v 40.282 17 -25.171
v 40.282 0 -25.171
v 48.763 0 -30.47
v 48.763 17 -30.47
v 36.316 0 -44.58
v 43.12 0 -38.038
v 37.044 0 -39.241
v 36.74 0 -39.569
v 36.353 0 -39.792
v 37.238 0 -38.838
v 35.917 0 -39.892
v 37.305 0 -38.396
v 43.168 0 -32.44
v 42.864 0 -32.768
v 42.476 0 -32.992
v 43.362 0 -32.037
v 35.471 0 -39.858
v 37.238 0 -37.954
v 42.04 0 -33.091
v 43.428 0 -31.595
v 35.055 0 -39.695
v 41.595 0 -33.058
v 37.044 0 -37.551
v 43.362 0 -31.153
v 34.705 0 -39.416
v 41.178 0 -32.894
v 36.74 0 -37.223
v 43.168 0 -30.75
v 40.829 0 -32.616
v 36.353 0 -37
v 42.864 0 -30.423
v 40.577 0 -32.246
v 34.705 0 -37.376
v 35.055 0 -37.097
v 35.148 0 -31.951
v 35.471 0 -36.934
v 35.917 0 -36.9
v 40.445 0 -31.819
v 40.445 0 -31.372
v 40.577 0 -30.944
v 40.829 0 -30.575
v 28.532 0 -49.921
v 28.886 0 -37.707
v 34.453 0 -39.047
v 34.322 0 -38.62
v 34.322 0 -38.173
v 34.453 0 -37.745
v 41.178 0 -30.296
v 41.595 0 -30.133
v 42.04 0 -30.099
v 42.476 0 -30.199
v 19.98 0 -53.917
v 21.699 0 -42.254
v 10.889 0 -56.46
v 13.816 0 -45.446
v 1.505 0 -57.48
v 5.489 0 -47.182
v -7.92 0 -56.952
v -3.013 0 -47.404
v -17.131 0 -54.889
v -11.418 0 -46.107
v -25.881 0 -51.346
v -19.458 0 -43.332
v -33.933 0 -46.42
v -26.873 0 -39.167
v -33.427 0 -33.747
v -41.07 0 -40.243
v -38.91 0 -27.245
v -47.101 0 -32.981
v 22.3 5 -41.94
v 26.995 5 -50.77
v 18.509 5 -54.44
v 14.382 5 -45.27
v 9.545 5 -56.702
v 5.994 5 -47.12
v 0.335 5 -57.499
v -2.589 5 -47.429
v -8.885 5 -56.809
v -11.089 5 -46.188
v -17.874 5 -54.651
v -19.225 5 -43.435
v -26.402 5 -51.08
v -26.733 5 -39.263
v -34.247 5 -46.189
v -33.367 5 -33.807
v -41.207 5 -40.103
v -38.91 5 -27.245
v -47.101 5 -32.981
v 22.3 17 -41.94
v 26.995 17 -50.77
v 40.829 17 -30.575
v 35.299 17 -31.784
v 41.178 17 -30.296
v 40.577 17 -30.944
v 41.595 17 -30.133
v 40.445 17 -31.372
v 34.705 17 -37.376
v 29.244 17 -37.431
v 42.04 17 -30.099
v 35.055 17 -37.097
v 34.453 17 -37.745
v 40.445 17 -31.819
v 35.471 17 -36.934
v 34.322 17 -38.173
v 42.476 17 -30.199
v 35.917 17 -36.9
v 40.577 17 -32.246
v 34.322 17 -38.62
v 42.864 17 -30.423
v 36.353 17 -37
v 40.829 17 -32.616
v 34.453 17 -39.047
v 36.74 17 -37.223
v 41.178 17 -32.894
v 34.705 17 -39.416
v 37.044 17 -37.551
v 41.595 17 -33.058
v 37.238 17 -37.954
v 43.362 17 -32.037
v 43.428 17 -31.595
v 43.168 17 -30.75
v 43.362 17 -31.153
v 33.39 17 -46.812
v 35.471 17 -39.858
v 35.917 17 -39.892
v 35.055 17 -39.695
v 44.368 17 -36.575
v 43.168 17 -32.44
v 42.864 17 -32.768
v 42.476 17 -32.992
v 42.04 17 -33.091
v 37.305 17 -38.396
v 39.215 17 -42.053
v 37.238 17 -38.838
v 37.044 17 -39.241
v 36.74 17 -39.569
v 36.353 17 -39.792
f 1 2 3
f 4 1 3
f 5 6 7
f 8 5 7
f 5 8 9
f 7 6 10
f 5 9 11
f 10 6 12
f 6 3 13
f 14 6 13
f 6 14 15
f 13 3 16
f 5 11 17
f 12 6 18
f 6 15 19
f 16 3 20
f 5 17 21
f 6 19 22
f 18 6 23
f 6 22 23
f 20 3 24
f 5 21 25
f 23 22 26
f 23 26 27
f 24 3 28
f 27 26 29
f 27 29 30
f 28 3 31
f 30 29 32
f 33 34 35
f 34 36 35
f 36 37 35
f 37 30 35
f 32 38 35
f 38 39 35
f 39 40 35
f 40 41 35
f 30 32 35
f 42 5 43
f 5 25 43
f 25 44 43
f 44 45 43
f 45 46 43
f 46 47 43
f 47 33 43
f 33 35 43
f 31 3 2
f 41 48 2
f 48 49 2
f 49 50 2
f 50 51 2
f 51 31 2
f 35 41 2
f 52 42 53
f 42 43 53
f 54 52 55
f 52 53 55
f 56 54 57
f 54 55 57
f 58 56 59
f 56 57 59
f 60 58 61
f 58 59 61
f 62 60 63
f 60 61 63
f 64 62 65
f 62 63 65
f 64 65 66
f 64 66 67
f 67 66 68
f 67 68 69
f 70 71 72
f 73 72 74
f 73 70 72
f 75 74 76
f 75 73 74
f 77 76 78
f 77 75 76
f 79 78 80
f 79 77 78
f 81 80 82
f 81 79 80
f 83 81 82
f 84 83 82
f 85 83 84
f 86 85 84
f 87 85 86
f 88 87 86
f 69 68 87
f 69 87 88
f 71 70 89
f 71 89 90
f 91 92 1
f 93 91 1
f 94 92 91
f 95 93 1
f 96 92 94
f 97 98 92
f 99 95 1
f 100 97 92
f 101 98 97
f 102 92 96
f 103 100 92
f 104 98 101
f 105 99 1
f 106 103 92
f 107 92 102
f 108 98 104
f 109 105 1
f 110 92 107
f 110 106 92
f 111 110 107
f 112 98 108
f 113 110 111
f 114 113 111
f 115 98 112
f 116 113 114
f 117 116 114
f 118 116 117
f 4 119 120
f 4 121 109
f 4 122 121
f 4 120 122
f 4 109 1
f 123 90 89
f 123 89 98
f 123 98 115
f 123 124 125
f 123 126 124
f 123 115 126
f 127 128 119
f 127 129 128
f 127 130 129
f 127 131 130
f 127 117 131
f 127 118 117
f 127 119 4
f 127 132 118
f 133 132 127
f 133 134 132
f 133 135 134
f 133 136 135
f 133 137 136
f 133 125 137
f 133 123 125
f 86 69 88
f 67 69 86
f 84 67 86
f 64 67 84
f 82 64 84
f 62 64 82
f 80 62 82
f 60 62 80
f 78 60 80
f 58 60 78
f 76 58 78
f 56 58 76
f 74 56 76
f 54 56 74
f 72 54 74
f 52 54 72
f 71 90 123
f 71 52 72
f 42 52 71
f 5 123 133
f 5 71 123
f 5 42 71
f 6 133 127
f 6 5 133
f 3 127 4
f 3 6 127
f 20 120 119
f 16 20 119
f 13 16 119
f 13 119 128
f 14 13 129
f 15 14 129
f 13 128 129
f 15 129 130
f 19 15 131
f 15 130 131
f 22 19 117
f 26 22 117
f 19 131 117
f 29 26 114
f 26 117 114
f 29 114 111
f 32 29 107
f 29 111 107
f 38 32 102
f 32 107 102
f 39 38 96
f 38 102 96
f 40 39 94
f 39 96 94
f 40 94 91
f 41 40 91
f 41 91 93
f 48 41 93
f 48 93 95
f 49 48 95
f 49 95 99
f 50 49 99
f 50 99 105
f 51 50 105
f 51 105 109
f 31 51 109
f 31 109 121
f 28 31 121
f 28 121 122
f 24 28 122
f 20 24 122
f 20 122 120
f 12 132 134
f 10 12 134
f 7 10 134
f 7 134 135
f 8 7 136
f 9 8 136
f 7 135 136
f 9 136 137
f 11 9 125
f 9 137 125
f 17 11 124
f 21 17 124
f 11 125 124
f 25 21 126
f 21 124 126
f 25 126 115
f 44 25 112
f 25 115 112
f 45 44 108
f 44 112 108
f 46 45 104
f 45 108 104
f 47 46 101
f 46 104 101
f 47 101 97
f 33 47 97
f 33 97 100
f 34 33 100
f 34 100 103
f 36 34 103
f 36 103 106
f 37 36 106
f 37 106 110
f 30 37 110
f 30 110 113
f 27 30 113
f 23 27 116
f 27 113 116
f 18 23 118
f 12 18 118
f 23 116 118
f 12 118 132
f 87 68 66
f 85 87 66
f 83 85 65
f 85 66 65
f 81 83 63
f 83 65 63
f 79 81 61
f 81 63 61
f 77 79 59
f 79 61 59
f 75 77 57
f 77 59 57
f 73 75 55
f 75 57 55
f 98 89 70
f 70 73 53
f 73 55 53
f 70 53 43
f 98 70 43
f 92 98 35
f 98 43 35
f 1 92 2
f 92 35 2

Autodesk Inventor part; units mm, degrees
ref_plane "YZ Plane" through (0, 0, 0) normal (1, 0, 0) x (0, 1, 0)
ref_plane "XZ Plane" through (0, 0, 0) normal (0, 1, 0) x (-1, 0, 0)
ref_plane "XY Plane" through (0, 0, 0) normal (0, 0, 1) x (1, 0, 0)
sketch "Sketch1" plane through (0, 0, 0) normal (0, 1, 0) x (-1, 0, 0)
  arc A0 (-40.2823, -25.1712) -> (38.9097, -27.2449) centre (0, 0) ccw
  line L0 (-40.2823, -25.1712) -> (-48.7628, -30.4704)
  line L1 (38.9097, -27.2449) -> (47.1012, -32.9806)
  arc A1 (-48.7628, -30.4704) -> (47.1012, -32.9806) centre (0, 0) ccw
  line L2 (0, -70.4825) -> (0, 11.7471) construction
  dimension "d0" = 47.5
  dimension "d1" = 57.5
  dimension "d2" = 55
  dimension "d3" = 58
extrude "Extrusion1" add sketch "Sketch1" along normal blind 5
sketch "Sketch2" plane through (0, 5, 0) normal (0, 1, 0) x (1, 0, 0)
  line L0 (40.2823, 25.1712) -> (48.7628, 30.4704) projected
  arc A0 (40.2823, 25.1712) -> (-38.9097, 27.2449) centre (0, 0) ccw projected
  arc A1 (48.7628, 30.4704) -> (-47.1012, 32.9806) centre (0, 0) ccw projected
  line L1 (22.2999, 41.94) -> (26.9946, 50.7695)
  dimension "d6" = 30
extrude "Extrusion2" add sketch "Sketch2" along normal blind 12
sketch "Sketch3" plane through (0, 17, 0) normal (0, 1, 0) x (1, 0, 0)
  circle A0 centre (41.9284, 31.5953) radius 1.5
  arc A1 (40.2823, 25.1712) -> (22.2999, 41.94) centre (0, 0) ccw construction
  arc A2 (48.7628, 30.4704) -> (26.9946, 50.7695) centre (0, 0) ccw construction
  line L0 (40.2823, 25.1712) -> (48.7628, 30.4704) construction
  line L1 (26.9946, 50.7695) -> (22.2999, 41.94) construction
  line L2 (37.9352, 28.5862) -> (45.9215, 34.6044) construction
  line L3 (32.3949, 34.7393) -> (39.2149, 42.0528) construction
  circle A3 centre (35.8049, 38.3961) radius 1.5
  dimension "d9" = 3
  dimension "d10" = 5
  dimension "d11" = 15
extrude "Extrusion3" cut sketch "Sketch3" against normal up to surface (17 mm away)
properties part number "Right_Bottom_Gripper"
